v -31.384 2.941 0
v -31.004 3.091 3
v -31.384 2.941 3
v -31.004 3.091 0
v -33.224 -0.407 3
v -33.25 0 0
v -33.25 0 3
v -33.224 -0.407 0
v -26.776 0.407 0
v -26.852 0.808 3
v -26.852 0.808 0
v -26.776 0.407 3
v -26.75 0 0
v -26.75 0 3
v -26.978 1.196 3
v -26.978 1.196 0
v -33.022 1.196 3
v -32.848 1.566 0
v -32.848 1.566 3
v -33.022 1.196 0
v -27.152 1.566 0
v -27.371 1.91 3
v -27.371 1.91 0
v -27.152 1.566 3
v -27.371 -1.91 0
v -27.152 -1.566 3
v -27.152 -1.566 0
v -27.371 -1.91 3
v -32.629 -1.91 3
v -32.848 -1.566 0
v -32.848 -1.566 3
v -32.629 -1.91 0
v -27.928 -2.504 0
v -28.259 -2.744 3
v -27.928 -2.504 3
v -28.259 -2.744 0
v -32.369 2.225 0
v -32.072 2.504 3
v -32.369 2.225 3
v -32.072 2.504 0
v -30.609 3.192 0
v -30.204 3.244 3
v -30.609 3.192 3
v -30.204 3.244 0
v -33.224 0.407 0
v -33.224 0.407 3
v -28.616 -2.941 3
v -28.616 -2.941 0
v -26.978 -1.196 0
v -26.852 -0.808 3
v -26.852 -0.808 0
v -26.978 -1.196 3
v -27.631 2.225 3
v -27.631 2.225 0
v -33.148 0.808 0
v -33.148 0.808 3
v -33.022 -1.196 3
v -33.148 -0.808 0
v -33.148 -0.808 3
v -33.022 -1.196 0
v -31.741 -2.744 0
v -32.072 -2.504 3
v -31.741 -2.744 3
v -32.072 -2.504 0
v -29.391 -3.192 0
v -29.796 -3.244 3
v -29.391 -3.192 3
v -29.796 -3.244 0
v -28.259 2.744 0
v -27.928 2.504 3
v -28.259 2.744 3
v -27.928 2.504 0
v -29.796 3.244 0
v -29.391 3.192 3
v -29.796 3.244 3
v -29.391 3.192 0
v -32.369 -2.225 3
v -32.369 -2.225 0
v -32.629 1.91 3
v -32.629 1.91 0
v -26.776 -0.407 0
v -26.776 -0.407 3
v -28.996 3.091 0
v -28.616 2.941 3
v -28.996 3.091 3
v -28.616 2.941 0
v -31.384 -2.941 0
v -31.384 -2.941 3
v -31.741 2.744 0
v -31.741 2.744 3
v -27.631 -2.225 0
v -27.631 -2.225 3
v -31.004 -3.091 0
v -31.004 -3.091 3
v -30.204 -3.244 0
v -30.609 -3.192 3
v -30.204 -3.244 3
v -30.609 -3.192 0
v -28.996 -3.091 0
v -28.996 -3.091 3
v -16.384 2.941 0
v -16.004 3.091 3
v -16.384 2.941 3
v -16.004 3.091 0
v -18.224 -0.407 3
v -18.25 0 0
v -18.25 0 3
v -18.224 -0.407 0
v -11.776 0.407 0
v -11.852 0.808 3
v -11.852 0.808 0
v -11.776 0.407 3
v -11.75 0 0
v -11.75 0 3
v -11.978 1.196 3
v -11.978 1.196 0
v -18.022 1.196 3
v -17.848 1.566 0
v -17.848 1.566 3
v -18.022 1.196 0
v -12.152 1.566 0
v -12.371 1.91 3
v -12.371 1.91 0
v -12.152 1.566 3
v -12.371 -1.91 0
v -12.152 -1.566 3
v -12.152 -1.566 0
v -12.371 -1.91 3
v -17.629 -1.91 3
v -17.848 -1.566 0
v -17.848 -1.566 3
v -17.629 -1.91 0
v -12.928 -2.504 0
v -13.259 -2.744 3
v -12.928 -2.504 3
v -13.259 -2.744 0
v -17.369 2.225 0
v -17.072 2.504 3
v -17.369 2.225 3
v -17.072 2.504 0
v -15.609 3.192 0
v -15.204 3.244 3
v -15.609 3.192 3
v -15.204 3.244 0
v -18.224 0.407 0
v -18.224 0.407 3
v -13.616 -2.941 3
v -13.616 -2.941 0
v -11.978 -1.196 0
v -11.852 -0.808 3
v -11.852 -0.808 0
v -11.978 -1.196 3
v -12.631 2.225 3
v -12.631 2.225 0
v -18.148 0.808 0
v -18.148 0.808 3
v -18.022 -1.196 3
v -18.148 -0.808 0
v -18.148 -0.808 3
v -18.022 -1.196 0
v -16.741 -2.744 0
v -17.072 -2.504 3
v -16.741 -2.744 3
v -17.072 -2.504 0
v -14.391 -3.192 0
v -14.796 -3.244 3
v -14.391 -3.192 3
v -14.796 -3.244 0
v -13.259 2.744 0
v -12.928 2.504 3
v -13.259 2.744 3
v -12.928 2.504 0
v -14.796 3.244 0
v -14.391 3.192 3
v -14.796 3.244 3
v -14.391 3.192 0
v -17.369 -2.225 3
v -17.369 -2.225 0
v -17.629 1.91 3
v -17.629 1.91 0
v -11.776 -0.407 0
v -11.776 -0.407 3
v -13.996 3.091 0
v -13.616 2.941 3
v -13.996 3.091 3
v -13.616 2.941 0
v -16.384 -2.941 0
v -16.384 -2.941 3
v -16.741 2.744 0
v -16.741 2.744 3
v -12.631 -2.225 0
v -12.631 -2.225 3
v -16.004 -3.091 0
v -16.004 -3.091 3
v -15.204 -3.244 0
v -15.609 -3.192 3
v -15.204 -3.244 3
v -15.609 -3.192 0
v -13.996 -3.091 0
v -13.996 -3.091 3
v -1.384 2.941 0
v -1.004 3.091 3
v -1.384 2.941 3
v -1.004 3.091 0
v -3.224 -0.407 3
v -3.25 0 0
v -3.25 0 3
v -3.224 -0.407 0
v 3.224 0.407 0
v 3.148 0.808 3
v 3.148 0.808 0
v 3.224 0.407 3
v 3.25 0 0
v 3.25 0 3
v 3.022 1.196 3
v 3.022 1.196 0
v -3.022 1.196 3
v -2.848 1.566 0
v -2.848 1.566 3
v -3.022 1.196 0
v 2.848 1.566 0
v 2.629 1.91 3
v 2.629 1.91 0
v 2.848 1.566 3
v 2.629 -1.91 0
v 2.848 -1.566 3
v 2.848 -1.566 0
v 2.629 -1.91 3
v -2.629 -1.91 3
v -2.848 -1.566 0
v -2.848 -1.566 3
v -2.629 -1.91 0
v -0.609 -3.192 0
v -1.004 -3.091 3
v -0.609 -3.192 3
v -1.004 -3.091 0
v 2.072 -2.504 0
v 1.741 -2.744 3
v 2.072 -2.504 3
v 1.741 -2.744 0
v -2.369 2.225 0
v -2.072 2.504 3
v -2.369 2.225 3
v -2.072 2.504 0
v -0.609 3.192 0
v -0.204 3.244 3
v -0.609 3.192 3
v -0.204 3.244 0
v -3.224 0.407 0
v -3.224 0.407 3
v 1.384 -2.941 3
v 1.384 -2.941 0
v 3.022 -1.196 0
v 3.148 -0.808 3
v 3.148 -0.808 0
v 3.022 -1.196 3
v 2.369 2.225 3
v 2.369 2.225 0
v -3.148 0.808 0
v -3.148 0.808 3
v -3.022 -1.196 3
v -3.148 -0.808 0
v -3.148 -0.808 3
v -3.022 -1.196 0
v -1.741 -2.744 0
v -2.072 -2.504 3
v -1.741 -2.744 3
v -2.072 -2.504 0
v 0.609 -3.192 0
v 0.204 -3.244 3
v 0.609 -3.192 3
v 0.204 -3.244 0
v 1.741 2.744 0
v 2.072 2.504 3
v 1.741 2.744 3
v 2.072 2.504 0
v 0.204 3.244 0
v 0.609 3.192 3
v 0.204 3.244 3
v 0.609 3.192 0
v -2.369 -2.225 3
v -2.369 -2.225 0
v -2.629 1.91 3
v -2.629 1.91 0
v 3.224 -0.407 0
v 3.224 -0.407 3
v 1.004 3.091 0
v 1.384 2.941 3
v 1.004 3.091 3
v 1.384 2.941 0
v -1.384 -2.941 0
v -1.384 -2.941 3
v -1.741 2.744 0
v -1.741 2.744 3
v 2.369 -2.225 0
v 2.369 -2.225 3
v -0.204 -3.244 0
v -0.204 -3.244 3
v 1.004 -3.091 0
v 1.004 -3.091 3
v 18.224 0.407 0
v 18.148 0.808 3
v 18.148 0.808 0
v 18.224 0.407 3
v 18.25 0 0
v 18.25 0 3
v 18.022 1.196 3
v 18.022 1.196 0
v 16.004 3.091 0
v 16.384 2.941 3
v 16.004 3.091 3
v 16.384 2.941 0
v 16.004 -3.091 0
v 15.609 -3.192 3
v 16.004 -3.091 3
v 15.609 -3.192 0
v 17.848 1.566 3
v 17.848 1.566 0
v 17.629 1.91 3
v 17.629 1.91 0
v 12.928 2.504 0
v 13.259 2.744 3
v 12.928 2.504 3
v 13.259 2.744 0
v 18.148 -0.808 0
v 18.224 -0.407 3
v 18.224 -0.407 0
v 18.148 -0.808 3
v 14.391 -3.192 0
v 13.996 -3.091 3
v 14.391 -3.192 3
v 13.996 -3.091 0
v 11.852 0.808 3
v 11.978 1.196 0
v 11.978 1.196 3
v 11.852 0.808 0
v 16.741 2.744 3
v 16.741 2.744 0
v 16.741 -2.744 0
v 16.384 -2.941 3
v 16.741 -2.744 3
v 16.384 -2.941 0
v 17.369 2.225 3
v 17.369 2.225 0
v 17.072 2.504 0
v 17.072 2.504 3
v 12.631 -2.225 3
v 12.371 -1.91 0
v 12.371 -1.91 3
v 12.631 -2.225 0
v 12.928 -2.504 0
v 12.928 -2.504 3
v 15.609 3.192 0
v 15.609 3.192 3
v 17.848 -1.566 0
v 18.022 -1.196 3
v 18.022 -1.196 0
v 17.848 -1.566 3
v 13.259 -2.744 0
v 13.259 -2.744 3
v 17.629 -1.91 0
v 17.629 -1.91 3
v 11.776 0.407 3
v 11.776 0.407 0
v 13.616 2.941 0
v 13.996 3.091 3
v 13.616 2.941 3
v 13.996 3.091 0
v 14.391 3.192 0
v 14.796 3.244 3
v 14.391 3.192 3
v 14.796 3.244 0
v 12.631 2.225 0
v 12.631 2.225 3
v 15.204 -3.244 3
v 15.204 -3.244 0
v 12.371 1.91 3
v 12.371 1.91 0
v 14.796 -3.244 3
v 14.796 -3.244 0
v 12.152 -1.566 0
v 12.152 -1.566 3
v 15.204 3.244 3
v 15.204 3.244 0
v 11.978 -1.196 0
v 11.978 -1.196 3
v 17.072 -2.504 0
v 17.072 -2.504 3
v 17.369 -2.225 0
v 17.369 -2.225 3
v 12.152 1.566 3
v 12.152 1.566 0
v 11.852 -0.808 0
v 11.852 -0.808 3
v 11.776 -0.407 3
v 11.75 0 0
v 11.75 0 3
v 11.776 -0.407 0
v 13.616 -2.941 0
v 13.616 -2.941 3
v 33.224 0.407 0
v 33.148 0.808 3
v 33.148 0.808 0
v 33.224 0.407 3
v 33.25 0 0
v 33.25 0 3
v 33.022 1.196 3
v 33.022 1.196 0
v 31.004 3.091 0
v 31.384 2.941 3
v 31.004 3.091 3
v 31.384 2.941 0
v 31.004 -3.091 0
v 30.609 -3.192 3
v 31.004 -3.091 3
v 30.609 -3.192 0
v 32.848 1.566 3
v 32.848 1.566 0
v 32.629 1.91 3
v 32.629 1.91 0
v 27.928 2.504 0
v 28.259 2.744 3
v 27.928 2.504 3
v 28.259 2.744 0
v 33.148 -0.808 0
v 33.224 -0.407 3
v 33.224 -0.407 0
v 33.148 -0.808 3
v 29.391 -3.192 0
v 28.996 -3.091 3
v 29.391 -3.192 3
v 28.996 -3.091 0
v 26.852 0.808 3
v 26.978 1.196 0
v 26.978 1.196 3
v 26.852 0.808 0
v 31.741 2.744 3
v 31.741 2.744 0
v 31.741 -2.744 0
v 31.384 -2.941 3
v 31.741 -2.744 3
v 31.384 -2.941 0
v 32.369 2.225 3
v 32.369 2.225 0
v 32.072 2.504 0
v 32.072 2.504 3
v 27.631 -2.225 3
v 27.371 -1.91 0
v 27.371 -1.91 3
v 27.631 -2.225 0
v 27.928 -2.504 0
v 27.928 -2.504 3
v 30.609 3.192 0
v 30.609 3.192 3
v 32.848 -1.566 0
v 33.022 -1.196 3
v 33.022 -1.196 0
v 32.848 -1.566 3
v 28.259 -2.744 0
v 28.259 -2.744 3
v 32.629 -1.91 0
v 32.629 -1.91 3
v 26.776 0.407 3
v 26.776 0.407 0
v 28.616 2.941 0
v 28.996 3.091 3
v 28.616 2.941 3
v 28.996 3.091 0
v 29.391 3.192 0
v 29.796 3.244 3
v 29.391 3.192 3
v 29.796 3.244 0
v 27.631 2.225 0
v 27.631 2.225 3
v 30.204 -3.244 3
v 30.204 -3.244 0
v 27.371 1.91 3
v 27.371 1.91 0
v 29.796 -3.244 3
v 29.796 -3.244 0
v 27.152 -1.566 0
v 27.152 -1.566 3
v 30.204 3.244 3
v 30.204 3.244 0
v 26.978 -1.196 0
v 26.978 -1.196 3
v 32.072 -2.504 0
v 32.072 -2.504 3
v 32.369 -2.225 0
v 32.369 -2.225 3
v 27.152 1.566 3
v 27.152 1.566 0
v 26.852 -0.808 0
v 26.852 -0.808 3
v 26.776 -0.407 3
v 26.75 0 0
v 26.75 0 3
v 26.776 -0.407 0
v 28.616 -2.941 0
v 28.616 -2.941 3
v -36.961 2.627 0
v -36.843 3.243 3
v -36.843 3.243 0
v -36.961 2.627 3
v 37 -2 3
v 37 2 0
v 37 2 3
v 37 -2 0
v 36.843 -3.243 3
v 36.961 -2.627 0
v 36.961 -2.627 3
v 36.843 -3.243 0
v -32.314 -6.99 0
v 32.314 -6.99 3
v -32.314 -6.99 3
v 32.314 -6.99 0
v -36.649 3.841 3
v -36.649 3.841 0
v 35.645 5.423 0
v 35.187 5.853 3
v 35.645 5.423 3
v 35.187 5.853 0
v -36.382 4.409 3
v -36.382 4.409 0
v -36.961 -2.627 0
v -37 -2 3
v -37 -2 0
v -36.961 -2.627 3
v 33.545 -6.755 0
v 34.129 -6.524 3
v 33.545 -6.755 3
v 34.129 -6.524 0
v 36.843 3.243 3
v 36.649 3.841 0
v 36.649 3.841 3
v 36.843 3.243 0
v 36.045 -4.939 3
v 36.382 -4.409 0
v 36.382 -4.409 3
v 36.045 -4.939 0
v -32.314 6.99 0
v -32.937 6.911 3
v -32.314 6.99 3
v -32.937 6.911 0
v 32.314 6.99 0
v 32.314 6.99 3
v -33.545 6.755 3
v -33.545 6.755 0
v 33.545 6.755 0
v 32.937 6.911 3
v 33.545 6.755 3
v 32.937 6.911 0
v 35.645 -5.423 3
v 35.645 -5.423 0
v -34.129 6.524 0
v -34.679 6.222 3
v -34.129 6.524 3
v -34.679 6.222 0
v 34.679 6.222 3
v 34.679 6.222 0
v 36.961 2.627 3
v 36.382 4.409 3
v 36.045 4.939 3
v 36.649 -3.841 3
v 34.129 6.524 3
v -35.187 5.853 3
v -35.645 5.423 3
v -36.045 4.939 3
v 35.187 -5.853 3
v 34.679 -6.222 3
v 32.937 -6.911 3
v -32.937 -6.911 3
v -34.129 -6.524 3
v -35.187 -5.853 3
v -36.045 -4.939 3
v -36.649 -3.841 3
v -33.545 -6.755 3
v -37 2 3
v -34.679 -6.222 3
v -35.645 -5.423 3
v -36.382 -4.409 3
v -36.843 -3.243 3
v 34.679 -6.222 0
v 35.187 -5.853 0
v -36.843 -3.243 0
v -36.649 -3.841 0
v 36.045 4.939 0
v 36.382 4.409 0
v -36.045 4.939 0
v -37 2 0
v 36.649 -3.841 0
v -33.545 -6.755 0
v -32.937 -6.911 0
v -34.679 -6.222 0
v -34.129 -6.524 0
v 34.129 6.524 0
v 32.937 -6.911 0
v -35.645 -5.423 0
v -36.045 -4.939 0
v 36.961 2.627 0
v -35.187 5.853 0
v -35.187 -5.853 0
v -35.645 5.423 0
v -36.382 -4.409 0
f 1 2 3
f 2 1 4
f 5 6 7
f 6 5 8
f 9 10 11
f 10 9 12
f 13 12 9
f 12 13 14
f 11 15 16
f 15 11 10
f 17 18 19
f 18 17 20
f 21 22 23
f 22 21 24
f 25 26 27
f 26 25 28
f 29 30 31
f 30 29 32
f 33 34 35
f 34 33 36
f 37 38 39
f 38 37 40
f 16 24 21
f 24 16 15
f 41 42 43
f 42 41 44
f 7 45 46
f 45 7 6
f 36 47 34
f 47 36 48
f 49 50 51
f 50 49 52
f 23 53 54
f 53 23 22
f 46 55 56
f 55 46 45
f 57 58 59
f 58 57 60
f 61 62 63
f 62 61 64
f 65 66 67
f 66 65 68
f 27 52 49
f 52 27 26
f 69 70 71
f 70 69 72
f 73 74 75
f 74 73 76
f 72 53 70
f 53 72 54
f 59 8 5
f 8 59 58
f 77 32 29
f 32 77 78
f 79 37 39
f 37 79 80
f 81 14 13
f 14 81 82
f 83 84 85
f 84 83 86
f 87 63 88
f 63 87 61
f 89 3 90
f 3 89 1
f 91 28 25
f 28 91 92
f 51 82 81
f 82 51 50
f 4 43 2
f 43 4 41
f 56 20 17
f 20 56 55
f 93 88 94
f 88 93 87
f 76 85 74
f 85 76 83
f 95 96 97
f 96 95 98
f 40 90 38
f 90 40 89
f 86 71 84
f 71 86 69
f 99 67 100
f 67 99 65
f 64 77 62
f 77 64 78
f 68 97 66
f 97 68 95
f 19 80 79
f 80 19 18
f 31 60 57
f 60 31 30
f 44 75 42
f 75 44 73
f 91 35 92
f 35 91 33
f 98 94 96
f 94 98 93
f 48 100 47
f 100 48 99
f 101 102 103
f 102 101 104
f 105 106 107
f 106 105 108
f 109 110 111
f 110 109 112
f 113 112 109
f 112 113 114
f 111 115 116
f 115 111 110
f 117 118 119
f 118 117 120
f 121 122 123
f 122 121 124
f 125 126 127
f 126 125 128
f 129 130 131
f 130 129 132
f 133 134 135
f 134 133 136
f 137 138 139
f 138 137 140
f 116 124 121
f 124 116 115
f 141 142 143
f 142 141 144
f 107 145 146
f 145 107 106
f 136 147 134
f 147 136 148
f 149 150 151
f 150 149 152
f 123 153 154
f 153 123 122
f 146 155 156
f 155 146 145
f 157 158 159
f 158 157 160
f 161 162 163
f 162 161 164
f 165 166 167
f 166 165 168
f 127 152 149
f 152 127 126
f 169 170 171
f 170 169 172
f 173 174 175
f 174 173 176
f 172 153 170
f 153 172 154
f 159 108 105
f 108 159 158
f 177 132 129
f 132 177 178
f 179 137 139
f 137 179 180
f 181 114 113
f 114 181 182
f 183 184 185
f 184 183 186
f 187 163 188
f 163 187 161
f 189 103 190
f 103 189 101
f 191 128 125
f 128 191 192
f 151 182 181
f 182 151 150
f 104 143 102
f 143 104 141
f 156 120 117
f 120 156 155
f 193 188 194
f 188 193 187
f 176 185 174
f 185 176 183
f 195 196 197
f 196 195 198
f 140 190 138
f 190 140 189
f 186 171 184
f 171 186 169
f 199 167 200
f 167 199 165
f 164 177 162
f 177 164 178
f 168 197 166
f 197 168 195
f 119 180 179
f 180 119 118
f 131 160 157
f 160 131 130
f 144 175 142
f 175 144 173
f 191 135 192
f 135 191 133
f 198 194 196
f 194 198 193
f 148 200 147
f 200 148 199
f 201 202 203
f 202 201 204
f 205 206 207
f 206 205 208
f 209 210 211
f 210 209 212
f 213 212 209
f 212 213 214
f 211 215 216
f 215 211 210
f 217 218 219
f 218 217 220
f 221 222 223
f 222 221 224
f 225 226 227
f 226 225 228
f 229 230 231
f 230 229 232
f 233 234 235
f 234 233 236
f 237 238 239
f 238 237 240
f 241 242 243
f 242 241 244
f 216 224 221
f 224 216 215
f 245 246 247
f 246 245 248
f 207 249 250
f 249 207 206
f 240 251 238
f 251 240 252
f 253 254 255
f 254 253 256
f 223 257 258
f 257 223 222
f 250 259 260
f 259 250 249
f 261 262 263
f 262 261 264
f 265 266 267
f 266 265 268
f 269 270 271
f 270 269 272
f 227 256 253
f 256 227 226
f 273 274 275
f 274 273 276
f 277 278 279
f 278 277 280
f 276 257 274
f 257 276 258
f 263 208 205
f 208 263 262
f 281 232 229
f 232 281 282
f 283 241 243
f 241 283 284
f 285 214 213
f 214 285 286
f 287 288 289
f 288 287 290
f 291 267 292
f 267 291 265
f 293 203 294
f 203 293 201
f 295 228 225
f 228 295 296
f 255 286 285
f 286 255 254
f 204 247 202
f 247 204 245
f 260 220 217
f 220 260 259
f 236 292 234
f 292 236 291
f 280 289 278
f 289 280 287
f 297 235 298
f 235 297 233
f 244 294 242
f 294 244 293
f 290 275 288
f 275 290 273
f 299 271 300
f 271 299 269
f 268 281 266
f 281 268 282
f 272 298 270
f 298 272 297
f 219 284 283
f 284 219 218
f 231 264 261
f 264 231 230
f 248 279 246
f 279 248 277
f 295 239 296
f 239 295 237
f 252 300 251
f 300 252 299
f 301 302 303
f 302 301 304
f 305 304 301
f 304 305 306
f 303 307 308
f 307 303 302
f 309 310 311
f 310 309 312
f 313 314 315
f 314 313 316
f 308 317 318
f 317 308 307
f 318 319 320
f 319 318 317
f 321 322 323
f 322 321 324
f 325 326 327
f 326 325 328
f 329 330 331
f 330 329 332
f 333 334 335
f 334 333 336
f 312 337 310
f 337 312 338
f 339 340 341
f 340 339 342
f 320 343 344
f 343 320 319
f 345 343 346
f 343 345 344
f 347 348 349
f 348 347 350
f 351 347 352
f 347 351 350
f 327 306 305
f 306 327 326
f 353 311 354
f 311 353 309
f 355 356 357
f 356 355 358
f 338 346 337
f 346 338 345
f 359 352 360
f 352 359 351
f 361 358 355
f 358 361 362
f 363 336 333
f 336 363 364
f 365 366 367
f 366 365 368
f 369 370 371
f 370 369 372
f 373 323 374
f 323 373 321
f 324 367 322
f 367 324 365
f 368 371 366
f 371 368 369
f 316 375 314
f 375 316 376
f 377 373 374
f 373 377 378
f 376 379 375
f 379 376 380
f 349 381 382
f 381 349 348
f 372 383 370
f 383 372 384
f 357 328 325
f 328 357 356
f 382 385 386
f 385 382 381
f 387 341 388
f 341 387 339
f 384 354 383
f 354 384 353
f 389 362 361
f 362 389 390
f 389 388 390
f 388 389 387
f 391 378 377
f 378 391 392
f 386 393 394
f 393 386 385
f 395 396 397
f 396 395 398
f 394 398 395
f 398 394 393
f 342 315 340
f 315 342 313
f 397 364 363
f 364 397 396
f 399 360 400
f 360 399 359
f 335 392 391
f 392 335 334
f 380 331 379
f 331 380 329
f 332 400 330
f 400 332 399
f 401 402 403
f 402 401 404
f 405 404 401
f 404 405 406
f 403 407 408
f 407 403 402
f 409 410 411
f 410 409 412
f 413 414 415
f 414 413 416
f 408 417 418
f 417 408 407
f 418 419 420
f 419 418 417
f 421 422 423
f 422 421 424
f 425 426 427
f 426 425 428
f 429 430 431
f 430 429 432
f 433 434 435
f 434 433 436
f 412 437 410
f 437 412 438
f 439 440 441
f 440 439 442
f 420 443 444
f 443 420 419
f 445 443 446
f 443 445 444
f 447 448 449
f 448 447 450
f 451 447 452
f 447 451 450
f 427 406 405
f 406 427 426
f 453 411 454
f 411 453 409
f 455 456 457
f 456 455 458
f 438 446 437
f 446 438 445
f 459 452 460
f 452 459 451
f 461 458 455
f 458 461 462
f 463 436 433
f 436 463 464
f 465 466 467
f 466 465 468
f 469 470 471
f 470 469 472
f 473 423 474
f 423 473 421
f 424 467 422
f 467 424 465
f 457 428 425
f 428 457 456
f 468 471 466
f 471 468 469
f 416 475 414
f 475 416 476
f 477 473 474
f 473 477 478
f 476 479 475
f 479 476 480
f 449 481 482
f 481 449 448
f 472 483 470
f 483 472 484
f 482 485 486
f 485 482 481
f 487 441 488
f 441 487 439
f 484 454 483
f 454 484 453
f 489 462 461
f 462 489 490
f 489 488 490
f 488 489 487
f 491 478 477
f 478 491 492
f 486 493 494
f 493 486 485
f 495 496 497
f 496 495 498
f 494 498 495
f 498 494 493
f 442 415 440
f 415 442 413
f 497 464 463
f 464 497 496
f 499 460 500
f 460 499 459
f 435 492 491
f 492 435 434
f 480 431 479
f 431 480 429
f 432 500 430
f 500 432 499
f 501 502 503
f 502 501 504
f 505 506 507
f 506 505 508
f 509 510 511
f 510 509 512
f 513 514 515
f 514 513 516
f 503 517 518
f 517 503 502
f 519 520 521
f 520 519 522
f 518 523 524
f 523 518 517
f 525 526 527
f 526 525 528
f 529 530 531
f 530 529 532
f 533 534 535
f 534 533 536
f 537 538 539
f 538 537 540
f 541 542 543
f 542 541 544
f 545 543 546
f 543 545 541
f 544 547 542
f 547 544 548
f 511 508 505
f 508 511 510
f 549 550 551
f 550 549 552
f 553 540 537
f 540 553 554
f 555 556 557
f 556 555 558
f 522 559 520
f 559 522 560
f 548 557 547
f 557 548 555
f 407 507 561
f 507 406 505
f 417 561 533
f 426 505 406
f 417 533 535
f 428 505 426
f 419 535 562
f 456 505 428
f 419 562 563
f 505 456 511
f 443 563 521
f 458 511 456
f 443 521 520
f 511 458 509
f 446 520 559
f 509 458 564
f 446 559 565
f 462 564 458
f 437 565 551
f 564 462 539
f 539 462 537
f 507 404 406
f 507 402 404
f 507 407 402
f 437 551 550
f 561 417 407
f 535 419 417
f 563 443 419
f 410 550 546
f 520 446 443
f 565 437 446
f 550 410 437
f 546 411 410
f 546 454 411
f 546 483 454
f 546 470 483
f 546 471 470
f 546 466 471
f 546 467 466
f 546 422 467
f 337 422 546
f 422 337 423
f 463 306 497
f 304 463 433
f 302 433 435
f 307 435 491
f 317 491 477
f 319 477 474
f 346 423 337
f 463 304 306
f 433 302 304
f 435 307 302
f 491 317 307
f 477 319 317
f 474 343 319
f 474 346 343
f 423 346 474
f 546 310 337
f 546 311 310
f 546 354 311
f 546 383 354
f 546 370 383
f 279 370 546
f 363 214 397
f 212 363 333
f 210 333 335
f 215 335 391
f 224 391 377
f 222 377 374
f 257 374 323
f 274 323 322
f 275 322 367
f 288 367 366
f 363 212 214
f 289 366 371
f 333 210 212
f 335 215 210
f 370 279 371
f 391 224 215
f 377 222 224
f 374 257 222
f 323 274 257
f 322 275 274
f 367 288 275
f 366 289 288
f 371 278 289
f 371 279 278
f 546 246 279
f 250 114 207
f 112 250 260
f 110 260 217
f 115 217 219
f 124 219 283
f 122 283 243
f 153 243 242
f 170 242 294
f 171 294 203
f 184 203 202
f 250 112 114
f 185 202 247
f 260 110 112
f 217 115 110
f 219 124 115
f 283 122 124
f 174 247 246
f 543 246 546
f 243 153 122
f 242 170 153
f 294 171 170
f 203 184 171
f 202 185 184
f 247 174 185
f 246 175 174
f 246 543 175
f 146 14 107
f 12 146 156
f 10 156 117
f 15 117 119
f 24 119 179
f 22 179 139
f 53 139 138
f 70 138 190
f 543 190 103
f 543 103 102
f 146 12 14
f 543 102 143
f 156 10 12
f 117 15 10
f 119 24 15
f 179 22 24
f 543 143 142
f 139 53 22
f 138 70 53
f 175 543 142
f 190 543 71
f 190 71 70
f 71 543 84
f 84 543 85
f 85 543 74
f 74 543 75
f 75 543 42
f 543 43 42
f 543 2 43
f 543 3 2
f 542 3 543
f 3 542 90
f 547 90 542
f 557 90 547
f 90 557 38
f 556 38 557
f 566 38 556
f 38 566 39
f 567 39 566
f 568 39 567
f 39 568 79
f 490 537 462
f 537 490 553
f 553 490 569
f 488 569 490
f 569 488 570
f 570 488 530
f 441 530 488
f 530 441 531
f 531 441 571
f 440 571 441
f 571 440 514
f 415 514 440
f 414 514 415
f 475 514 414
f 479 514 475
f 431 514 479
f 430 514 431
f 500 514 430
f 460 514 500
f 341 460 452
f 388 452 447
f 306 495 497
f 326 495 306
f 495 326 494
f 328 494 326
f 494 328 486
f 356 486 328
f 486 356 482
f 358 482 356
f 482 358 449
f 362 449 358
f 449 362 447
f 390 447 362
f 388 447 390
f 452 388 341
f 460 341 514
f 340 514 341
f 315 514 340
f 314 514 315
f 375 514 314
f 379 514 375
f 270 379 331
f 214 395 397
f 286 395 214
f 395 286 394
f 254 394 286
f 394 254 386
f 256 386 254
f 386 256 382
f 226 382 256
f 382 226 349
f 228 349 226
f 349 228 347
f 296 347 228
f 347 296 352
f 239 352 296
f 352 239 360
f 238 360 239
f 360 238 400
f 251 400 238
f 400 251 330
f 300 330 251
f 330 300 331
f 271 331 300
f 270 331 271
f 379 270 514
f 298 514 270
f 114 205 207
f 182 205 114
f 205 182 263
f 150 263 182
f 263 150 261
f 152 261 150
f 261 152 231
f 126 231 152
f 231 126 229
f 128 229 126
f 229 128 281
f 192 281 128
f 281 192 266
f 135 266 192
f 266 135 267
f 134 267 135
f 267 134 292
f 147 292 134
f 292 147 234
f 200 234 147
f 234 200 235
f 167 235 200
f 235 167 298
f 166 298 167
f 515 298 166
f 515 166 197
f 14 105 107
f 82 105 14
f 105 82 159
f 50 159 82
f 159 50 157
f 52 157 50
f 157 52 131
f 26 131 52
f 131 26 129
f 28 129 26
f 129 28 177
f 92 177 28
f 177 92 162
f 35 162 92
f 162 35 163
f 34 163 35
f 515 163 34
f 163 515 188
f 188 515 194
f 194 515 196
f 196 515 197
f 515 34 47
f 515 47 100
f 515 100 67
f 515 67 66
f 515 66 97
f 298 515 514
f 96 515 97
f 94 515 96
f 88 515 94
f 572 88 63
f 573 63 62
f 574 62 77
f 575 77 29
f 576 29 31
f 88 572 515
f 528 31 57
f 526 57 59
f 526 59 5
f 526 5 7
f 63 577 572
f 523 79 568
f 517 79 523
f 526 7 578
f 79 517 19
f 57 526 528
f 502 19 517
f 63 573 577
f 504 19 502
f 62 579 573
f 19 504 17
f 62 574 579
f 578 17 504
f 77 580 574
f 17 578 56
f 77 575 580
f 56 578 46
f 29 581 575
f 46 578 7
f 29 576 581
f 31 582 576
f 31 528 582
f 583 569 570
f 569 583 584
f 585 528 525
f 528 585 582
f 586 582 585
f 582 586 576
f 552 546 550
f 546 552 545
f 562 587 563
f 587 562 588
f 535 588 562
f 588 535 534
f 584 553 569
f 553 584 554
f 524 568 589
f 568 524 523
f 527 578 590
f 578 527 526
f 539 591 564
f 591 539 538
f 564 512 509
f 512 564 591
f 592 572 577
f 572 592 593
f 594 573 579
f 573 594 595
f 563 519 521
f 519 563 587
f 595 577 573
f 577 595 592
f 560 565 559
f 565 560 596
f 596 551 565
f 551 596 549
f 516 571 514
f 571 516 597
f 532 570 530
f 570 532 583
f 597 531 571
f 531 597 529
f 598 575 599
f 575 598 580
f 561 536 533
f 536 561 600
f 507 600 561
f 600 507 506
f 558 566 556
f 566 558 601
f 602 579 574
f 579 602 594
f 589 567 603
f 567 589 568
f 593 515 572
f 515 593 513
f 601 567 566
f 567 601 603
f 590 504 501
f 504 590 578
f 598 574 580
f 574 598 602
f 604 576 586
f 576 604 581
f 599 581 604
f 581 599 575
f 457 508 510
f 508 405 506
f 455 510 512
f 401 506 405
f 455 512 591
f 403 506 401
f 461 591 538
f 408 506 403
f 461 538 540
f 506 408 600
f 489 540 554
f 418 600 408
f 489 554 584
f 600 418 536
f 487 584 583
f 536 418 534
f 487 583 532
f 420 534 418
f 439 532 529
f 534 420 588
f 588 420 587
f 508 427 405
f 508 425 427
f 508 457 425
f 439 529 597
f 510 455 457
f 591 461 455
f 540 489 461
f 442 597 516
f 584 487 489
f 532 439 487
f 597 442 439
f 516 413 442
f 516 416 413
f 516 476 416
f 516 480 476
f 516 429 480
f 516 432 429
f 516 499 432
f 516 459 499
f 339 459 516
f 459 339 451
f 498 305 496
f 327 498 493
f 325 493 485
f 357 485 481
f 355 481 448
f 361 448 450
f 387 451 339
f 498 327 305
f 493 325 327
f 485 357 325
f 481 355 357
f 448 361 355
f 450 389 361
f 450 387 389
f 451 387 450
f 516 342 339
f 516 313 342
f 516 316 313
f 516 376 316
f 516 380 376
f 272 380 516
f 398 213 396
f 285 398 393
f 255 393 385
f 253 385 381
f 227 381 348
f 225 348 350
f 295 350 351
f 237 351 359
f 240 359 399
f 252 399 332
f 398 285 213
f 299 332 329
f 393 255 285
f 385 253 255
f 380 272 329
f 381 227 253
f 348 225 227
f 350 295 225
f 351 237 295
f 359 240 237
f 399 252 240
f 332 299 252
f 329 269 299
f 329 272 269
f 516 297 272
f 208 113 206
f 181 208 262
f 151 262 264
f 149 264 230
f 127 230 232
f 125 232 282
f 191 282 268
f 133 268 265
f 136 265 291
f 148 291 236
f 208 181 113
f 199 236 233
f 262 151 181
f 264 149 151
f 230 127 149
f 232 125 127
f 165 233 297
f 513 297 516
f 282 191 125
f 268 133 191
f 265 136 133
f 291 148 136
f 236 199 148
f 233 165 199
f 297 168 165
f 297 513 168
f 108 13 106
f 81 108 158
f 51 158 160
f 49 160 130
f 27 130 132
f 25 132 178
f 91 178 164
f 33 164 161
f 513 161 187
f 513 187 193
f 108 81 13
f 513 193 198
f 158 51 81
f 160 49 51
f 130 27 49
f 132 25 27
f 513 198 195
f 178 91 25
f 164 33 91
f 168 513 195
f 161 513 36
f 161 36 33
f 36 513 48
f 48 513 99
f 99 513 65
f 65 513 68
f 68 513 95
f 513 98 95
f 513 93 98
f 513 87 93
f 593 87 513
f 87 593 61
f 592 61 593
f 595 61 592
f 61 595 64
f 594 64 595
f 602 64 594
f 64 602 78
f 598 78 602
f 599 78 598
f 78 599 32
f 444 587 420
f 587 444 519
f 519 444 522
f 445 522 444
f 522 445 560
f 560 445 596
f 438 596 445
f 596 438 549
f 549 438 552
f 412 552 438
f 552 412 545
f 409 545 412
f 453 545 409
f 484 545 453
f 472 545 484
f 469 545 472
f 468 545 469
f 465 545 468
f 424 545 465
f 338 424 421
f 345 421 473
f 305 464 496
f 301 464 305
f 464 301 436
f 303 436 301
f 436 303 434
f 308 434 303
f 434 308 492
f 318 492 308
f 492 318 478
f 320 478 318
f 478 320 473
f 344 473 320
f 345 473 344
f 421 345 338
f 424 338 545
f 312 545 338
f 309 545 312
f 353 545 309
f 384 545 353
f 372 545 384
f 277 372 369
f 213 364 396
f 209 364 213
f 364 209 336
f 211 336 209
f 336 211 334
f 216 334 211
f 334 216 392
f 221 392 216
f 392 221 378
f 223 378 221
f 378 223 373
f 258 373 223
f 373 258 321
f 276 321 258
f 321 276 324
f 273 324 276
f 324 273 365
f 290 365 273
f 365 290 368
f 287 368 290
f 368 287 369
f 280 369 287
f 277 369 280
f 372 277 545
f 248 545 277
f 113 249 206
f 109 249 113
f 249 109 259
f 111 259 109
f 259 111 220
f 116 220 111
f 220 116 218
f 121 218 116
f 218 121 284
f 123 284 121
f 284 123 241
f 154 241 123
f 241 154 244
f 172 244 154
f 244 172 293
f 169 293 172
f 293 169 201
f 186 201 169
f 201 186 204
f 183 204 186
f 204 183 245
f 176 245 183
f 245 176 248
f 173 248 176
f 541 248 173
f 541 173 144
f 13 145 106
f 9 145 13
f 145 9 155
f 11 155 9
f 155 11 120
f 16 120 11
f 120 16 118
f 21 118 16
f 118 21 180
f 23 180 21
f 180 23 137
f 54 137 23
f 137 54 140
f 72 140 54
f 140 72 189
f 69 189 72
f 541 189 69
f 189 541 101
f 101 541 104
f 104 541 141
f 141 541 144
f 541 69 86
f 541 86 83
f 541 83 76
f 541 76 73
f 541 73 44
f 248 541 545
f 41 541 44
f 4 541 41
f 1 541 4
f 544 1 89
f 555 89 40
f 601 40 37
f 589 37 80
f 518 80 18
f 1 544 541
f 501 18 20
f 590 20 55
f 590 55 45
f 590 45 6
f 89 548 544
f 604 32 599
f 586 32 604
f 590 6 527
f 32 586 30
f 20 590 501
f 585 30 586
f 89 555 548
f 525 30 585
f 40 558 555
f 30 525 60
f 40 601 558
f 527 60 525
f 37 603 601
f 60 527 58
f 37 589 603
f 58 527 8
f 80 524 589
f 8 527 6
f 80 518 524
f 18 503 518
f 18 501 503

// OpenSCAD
// Generated by SolidPython 1.1.3 on 2023-03-13 21:42:52
$fn = 50;


difference() {
	union() {
		translate(v = [0, 0, 0]) {
			rotate(a = [0, 0, 0]) {
				hull() {
					translate(v = [-32.0000000000, 2.0000000000, 0]) {
						rotate(a = [0, 0, 0]) {
							translate(v = [0, 0, 0]) {
								rotate(a = [0, 0, 0]) {
									cylinder(h = 3, r = 5);
								}
							}
						}
					}
					translate(v = [32.0000000000, 2.0000000000, 0]) {
						rotate(a = [0, 0, 0]) {
							translate(v = [0, 0, 0]) {
								rotate(a = [0, 0, 0]) {
									cylinder(h = 3, r = 5);
								}
							}
						}
					}
					translate(v = [-32.0000000000, -2.0000000000, 0]) {
						rotate(a = [0, 0, 0]) {
							translate(v = [0, 0, 0]) {
								rotate(a = [0, 0, 0]) {
									cylinder(h = 3, r = 5);
								}
							}
						}
					}
					translate(v = [32.0000000000, -2.0000000000, 0]) {
						rotate(a = [0, 0, 0]) {
							translate(v = [0, 0, 0]) {
								rotate(a = [0, 0, 0]) {
									cylinder(h = 3, r = 5);
								}
							}
						}
					}
				}
			}
		}
	}
	union() {
		translate(v = [-30.0000000000, 0.0000000000, 0]) {
			rotate(a = [0, 0, 0]) {
				translate(v = [0, 0, -50]) {
					rotate(a = [0, 0, 0]) {
						cylinder(h = 100, r = 3.2500000000);
					}
				}
			}
		}
		translate(v = [-15.0000000000, 0.0000000000, 0]) {
			rotate(a = [0, 0, 0]) {
				translate(v = [0, 0, -50]) {
					rotate(a = [0, 0, 0]) {
						cylinder(h = 100, r = 3.2500000000);
					}
				}
			}
		}
		translate(v = [0.0000000000, 0.0000000000, 0]) {
			rotate(a = [0, 0, 0]) {
				translate(v = [0, 0, -50]) {
					rotate(a = [0, 0, 0]) {
						cylinder(h = 100, r = 3.2500000000);
					}
				}
			}
		}
		translate(v = [15.0000000000, 0.0000000000, 0]) {
			rotate(a = [0, 0, 0]) {
				translate(v = [0, 0, -50]) {
					rotate(a = [0, 0, 0]) {
						cylinder(h = 100, r = 3.2500000000);
					}
				}
			}
		}
		translate(v = [30.0000000000, 0.0000000000, 0]) {
			rotate(a = [0, 0, 0]) {
				translate(v = [0, 0, -50]) {
					rotate(a = [0, 0, 0]) {
						cylinder(h = 100, r = 3.2500000000);
					}
				}
			}
		}
	}
}
/***********************************************
*********      SolidPython code:      **********
************************************************
 
from solid import *
import os
import subprocess

import oomB

import opsc_library_gen

mode = "laser"
#mode = "3d_print"

defined_objects = {}

radius_dict = {}
countersunk_dict = {}


def set_mode(m):
    global mode
    mode = m
    radius_dict['M6'] = 6.5/2
    radius_dict['M3'] = 3.3/2
    if mode == "laser":
        radius_dict['M6'] = 6/2
        radius_dict['M3'] = 3/2

    countersunk_dict['M3'] = {}
    countersunk_dict['M3']['little_rad'] = radius_dict['M3']
    countersunk_dict['M3']['big_rad'] = (5.5+0.6)/2
    if mode == "laser":
        countersunk_dict['M3']['big_rad'] = (4.75+0.6)/2
        countersunk_dict['M3']['little_rad'] = (4.75+0.6)/2

    countersunk_dict['M3']['height'] = 1.7


def opsc_make_object(filename, objects, save_type="none",resolution=50, layers = 1, tilediff = 200, mode="laser", overwrite=True):
    if overwrite or not os.path.exists(filename):
        set_mode(mode)
        save_type = save_type.lower()
        os.makedirs(os.path.dirname(filename), exist_ok=True)
        final_object = opsc_get_object(objects, mode = mode)
        # Save the final object to the specified filename    
        scad_render_to_file(final_object, filename, file_header='$fn = %s;' % resolution, include_orig_code=True)
        if save_type == "all":
            saveToAll(filename)
        elif save_type == "dxf":
            saveToDxf(filename)
        if mode == "laser":
            filename_laser = filename.replace(".scad","-flat.scad")
            scad_render_to_file(getLaser(final_object, layers=layers, tilediff=tilediff), filename_laser, file_header='$fn = %s;' % resolution, include_orig_code=True)
            if save_type == "all":
                saveToAll(filename_laser)
            elif save_type == "dxf":
                saveToDxf(filename_laser)


def opsc_get_object(objects, mode = "laser"):
    # Create the solidpython objects only include the positive objects and if they don't have inclusion or their inclusion is either all or mode
    # Initialize an empty list to store the results
    positive_objects = []

    # Iterate over the "objects" list
    for obj in objects:
        # Check if the current object has a "type" key with a value of "positive"
        if obj['type'] == 'positive':
            # Check if the current object has an "inclusion" key and its value matches "mode",
            # or if the current object does not have an "inclusion" key at all
            if not 'inclusion' in obj or obj['inclusion'] == "all" or obj['inclusion'] == mode:
                # Call the "get_opsc_item" function with the current object as an argument
                opsc_item = get_opsc_item(obj)
                # Add the result to the "positive_objects" list
                positive_objects.append(opsc_item)
# Initialize an empty list to store the results
    negative_objects = []

    # Iterate over the "objects" list
    for obj in objects:
        # Check if the current object has a "type" key with a value of "negative"
        if obj['type'] == 'negative':
            # Check if the current object has an "inclusion" key and its value matches "mode",
            # or if the current object does not have an "inclusion" key at all
            if not 'inclusion' in obj or obj['inclusion'] == "all" or obj['inclusion'] == mode:
                # Call the "get_opsc_item" function with the current object as an argument
                opsc_item = get_opsc_item(obj)
                # Add the result to the "negative_objects" list
                negative_objects.append(opsc_item)
    
    #positive_objects = [get_opsc_item(obj) for obj in objects if obj['type'] == 'positive']
    #negative_objects = [get_opsc_item(obj) for obj in objects if obj['type'] == 'negative']
    # Union the positive objects
    positive_object = union()(*positive_objects)
    # Union the negative objects
    negative_object = union()(*negative_objects)
    # Create the final object by subtracting the negative objects from the positive objects
    return difference()(positive_object, negative_object)

def get_opsc_item(params):
    # A dictionary to map radius string values to numerical values
    #radius_dict = {'small': 5, 'medium': 10, 'large': 15}
    # An array of function names for basic shapes
    basic_shapes = ['cube', 'sphere', 'cylinder']
    
    # An array of function names for other shapes
    other_shapes = ['hole', 'slot', 'rounded_rectangle', 'countersunk', 'polyg']
    


    # Convert radius to r if present, and remove radius from the params dictionary
    if 'radius' in params:
        if isinstance(params['radius'], str):
            # Use the radius_dict to map the radius string value to a numerical value
            params['r'] = radius_dict[params['radius']]
        else:
            params['r'] = params['radius']
        del params['radius']
    

    # Check if the object type is a basic shape
    if params['shape'] in basic_shapes:
        # Remove shape and unexpected dictionary values
        allowed_keys = {'size', 'r', 'r1', 'r2', 'd', 'h', 'rw', 'rh', 'dw', 'dh'}
        shape_params = {k: v for k, v in params.items() if k in allowed_keys}

        #params['m'] = "#"
        ###split for adding modifier
        try:
            m = params['m']
            func = globals()[params['shape']]
            return_value = get_opsc_transform(params,func(**shape_params))
            return_value = (return_value).set_modifier(m)
            return return_value
        except KeyError as e:
            return get_opsc_transform(params,globals()[params['shape']](**shape_params))
        
    elif params['shape'] == 'polygon':
        # Remove shape and unexpected dictionary values
        h  = params['height']
        allowed_keys = {'points'}
        shape_params = {k: v for k, v in params.items() if k in allowed_keys}

        # Call the corresponding function for the shape parameter, using ** notation to pass the shape_params dictionary as keyword arguments
        params["rot"] = [0,0,0]        
        try:
            m = params['m']
            func = globals()[params['shape']]
            return_value = get_opsc_transform(params,linear_extrude(h)(globals()[params['shape']](**shape_params)))
            return_value = (return_value).set_modifier(m)
            return return_value
        except KeyError as e:
            return_value = get_opsc_transform(params,linear_extrude(h)(globals()[params['shape']](**shape_params)))
            return_value = (return_value)
            return return_value


    # If the object type is not a basic shape, check if it's a defined object or one of the other shapes
    elif params['shape'] in other_shapes:
        # Call the corresponding function for the shape parameter, passing the params dictionary as an argument
        p2 = copy.deepcopy(params)
        p2["pos"] = [0,0,0]
        return get_opsc_transform(params,globals()[params['shape']](p2))
    
    # If the object is not a basic shape or a defined object, try to import it from a .scad file
    else:
        obj = defined_objects[params['shape']]
        return get_opsc_transform(params,obj)

def get_opsc_transform(params, solid_obj):
    # Rotate the object based on the 'rot' field in the params dictionary, or the 'rotX', 'rotY', and 'rotZ' fields if 'rot' is not present
    rot = params.get('rot', [])
    if rot:
        rotX, rotY, rotZ = rot
    else:
        rotX = params.get('rotX', 0)
        rotY = params.get('rotY', 0)
        rotZ = params.get('rotZ', 0)
    solid_obj = rotate([rotX, rotY, rotZ])(solid_obj)

    # Translate the object based on the 'pos' field in the params dictionary, or the 'x', 'y', and 'z' fields if 'pos' is not present
    pos = params.get('pos', [])
    if pos:
        x, y, z = pos
    else:
        x = params.get('x', 0)
        y = params.get('y', 0)
        z = params.get('z', 0)
    solid_obj = translate([x, y, z])(solid_obj)
    return solid_obj


import random

def opsc_easy_array(type, shape, repeats, pos_start, shift_arr, **kwargs):
    for i in range(0,3):
        repeats.append(1)
        pos_start.append(0)
        shift_arr.append(0)
    return_objects = []

    for x in range(0,repeats[0]):
        for y in range(0,repeats[1]):
            for z in range(0,repeats[2]):
                return_objects.append(opsc_easy(type, shape, pos=[pos_start[0]+x*shift_arr[0],pos_start[1]+y*shift_arr[1],pos_start[2]+z*shift_arr[2]], **kwargs))
    return return_objects                



def opsc_easy(type, shape, **kwargs):
    obj = {
        'type': type,
        'shape': shape
    }
    for param in ['size', 'r', 'r1', 'r2', 'd', 'h', 'rw', 'rh', 'dw', 'dh', 'pos', 'x', 'y', 'z', 'rot', 'rotX', 'rotY', 'rotZ', "w", "inclusion", 'sides', 'height', "m"]:
        if param in kwargs:
            obj[param] = kwargs[param]
    return obj

def hole(params):
    p2 = copy.deepcopy(params)  
    # Check if the radius is a string and replace it with the corresponding value from the dictionary
    if isinstance(p2['r'], str):
        p2['r'] = radius_dict[p2['r']]
    
    # Set the height to 100 if not specified
    if 'h' not in p2:
        p2['h'] = 100
        p2["pos"] = [0,0,-50]
    p2["center"] = True
    # Create the cylinder object
    p2["shape"] = "cylinder"
    p2["type"] = "positive"

    return get_opsc_item(p2)

import copy

def countersunk(params):
    p2 = copy.deepcopy(params)
    counter_rad = p2['r']
    p2['r'] = radius_dict[p2['r']]
    hp = copy.deepcopy(p2)
    hp["type"] = "positive"
    hp["shape"] = "hole"
    del hp["rot"]
    hol = get_opsc_item(hp)
    
    cp = copy.deepcopy(p2)
    cp["h"] = countersunk_dict[counter_rad]["height"]
    cp["r2"] = countersunk_dict[counter_rad]["little_rad"]
    cp["r1"] = countersunk_dict[counter_rad]["big_rad"]
    del cp["r"]
    del cp["rot"]
    cp["type"] = "positive"
    cp["shape"] = "cylinder"
    cp["pos"] = [0,0,0]

    top = get_opsc_item(cp)
    return union()(hol,top)



def slot(params):  
    p2 = copy.deepcopy(params) 
    if isinstance(p2['r'], str):
        p2['r'] = radius_dict[p2['r']]
    p2["type"] = "positive"
    p2["shape"] = "hole"
    del p2["rot"]
    p2["pos"] = [0,0,0]
    left = copy.deepcopy(p2)
    right = copy.deepcopy(p2)
    left["pos"][0] = p2["w"] / 2 - p2["r"] 
    
    right["pos"][0] = -p2["w"] / 2 + p2["r"] 
    pass
    leftObj = get_opsc_item(left)
    rightObj = get_opsc_item(right)
    return hull()(leftObj, rightObj)

def rounded_rectangle(params):   
    p2 = copy.deepcopy(params) 
    p2["h"] = p2["size"][2]
    p2["pos"] = p2.get("pos", [0, 0, 0]) 
    p2["type"] = "positive"
    p2["shape"] = "hole"
    p2["pos"] = [0,0,0]
    
    if 'rot' in p2:
        del p2["rot"]   
    if 'r' not in p2:
        p2["r"] = 5 
    tl = copy.deepcopy(p2)
    tr = copy.deepcopy(p2)
    bl = copy.deepcopy(p2)
    br = copy.deepcopy(p2)
    tl["pos"][0] = -(p2["size"][0] - p2["r"]*2)/2
    tl["pos"][1] = (p2["size"][1] - p2["r"]*2)/2
    tr["pos"][0] = (p2["size"][0] - p2["r"]*2)/2
    tr["pos"][1] = (p2["size"][1] - p2["r"]*2)/2
    bl["pos"][0] = -(p2["size"][0] - p2["r"]*2)/2
    bl["pos"][1] = -(p2["size"][1] - p2["r"]*2)/2
    br["pos"][0] = (p2["size"][0] - p2["r"]*2)/2
    br["pos"][1] = -(p2["size"][1] - p2["r"]*2)/2
    del tl["size"]
    del tr["size"]
    del bl["size"]
    del br["size"]
    tlo = get_opsc_item(tl)
    tro = get_opsc_item(tr)
    blo = get_opsc_item(bl)
    bro = get_opsc_item(br)    
    return hull()(tlo, tro, blo, bro)



def polyg(params):
    p2 = copy.deepcopy(params) 
    p2["type"] = "positive"
    p2["shape"] = "polygon"
    p2["pos"] = [0,0,0]
    sides = p2["sides"]
    radius = p2["r"]    
    angles = [i * 360 / sides for i in range(sides)]
    points = regular_polygon(sides, radius)
    
    p2["points"] = points
    return get_opsc_item(p2)

import math

def regular_polygon(num_sides, radius):
    # Calculate the angle between each side
    angle = 2 * math.pi / num_sides

    # Calculate the points of the polygon
    points = []
    for i in range(num_sides):
        x = radius * math.cos(i * angle)
        y = radius * math.sin(i * angle)
        points.append((x, y))
    return points

def import_scad_object(filename):
    # Import the .scad file and convert it to a solidpython object
    #filename = "parts"
    obj = import_scad(filename)
    return obj.main()



import os
import solid as solidpython

# A dictionary to store the defined objects


def load_scad_objects():
    opsc_library_gen.gen_library(defined_objects)

import random

def test(num_objects):
    objects = []
    for i in range(num_objects):
        # Choose a random shape
        #shape = random.choice(['cube', 'sphere', 'cylinder', 'hole', 'slot', "rounded_rectangle"])
        shape = random.choice(["rounded_rectangle"])

        # Choose a random type
        type = random.choice(['positive', 'negative'])
        
        # Create an empty object dictionary
        obj = {'shape': shape, 'type': type}
        
        # Set shape-specific parameters
        if obj['shape'] in ['cube']:
            obj['size'] =  [random.uniform(5, 15), random.uniform(5, 15), random.uniform(5, 15)]
        if obj['shape'] in ['rounded_rectangle']:
            obj['size'] =  [random.uniform(5, 15), random.uniform(5, 15), random.uniform(5, 15)]
            obj['r'] = random.uniform(0.5, 5)
        elif obj['shape'] == 'sphere':
            obj['r'] = random.uniform(5, 15)
        elif obj['shape'] in ['cylinder', 'hole']:
            obj['r'] = random.uniform(0.5, 5)
            obj['h'] = random.uniform(5, 15)
        elif obj['shape'] == 'slot':
            obj['r'] = random.uniform(0.5, 5)
            obj['h'] = random.uniform(5, 15)
            obj['w'] = random.uniform(5, 15)
        
        # Set a random position and rotation
        obj['pos'] = [random.uniform(-20, 20), random.uniform(-20, 20), random.uniform(-20, 20)]
        obj['rot'] = [random.uniform(-180, 180), random.uniform(-180, 180), random.uniform(-180, 180)]
        
        # Add the object to the list
        objects.append(obj)
    return objects

####### old file saving
def saveToAll(fileIn):
    saveToStl(fileIn)
    saveToDxf(fileIn)
    saveToPng(fileIn)
    saveToSvg(fileIn)

def saveToDxf(fileIn, fileOut="", copy_to_laser=True):
    if fileOut == "":
        fileOut = fileIn.replace(".scad",".dxf")
    saveToFile(fileIn, fileOut)


    
def saveToPng(fileIn, fileOut="",extra="--render"):
    if fileOut == "":
        fileOut = fileIn.replace(".scad",".png")
    saveToFile(fileIn, fileOut)

def saveToStl(fileIn, fileOut=""):
    if fileOut == "":
        fileOut = fileIn.replace(".scad",".stl")
    saveToFile(fileIn, fileOut)
    
def saveToSvg(fileIn, fileOut=""):
    if fileOut == "":
        fileOut = fileIn.replace(".scad",".svg")
    saveToFile(fileIn, fileOut)

def saveToFile(fileIn, fileOut,extra=""):
    #extra = extra + " --colorscheme Tomorrow"

    launchStr = 'openscad -o "' + fileOut + '"' + extra + ' "' + fileIn + '"'
    if ".png" in fileOut:
        launchStr = launchStr + " --render"
    print("            saveToFile launch string: " + launchStr)
    subprocess.run(launchStr)
    x=0

def getLaser(final_object,start=1.5,layers=1,thickness=3,tilediff=200):
        rv= []

        for x in range(layers):
            rv.append(translate([0,x*tilediff,0])(
                    projection()(
                        intersection()(translate([-500,-500,start+x*thickness])(cube(size=[1000,1000,0.1])),
                            final_object
                        )
                    )
            )
            )
            
        return union()(rv)

set_mode("laser")
load_scad_objects() 
 
************************************************/
